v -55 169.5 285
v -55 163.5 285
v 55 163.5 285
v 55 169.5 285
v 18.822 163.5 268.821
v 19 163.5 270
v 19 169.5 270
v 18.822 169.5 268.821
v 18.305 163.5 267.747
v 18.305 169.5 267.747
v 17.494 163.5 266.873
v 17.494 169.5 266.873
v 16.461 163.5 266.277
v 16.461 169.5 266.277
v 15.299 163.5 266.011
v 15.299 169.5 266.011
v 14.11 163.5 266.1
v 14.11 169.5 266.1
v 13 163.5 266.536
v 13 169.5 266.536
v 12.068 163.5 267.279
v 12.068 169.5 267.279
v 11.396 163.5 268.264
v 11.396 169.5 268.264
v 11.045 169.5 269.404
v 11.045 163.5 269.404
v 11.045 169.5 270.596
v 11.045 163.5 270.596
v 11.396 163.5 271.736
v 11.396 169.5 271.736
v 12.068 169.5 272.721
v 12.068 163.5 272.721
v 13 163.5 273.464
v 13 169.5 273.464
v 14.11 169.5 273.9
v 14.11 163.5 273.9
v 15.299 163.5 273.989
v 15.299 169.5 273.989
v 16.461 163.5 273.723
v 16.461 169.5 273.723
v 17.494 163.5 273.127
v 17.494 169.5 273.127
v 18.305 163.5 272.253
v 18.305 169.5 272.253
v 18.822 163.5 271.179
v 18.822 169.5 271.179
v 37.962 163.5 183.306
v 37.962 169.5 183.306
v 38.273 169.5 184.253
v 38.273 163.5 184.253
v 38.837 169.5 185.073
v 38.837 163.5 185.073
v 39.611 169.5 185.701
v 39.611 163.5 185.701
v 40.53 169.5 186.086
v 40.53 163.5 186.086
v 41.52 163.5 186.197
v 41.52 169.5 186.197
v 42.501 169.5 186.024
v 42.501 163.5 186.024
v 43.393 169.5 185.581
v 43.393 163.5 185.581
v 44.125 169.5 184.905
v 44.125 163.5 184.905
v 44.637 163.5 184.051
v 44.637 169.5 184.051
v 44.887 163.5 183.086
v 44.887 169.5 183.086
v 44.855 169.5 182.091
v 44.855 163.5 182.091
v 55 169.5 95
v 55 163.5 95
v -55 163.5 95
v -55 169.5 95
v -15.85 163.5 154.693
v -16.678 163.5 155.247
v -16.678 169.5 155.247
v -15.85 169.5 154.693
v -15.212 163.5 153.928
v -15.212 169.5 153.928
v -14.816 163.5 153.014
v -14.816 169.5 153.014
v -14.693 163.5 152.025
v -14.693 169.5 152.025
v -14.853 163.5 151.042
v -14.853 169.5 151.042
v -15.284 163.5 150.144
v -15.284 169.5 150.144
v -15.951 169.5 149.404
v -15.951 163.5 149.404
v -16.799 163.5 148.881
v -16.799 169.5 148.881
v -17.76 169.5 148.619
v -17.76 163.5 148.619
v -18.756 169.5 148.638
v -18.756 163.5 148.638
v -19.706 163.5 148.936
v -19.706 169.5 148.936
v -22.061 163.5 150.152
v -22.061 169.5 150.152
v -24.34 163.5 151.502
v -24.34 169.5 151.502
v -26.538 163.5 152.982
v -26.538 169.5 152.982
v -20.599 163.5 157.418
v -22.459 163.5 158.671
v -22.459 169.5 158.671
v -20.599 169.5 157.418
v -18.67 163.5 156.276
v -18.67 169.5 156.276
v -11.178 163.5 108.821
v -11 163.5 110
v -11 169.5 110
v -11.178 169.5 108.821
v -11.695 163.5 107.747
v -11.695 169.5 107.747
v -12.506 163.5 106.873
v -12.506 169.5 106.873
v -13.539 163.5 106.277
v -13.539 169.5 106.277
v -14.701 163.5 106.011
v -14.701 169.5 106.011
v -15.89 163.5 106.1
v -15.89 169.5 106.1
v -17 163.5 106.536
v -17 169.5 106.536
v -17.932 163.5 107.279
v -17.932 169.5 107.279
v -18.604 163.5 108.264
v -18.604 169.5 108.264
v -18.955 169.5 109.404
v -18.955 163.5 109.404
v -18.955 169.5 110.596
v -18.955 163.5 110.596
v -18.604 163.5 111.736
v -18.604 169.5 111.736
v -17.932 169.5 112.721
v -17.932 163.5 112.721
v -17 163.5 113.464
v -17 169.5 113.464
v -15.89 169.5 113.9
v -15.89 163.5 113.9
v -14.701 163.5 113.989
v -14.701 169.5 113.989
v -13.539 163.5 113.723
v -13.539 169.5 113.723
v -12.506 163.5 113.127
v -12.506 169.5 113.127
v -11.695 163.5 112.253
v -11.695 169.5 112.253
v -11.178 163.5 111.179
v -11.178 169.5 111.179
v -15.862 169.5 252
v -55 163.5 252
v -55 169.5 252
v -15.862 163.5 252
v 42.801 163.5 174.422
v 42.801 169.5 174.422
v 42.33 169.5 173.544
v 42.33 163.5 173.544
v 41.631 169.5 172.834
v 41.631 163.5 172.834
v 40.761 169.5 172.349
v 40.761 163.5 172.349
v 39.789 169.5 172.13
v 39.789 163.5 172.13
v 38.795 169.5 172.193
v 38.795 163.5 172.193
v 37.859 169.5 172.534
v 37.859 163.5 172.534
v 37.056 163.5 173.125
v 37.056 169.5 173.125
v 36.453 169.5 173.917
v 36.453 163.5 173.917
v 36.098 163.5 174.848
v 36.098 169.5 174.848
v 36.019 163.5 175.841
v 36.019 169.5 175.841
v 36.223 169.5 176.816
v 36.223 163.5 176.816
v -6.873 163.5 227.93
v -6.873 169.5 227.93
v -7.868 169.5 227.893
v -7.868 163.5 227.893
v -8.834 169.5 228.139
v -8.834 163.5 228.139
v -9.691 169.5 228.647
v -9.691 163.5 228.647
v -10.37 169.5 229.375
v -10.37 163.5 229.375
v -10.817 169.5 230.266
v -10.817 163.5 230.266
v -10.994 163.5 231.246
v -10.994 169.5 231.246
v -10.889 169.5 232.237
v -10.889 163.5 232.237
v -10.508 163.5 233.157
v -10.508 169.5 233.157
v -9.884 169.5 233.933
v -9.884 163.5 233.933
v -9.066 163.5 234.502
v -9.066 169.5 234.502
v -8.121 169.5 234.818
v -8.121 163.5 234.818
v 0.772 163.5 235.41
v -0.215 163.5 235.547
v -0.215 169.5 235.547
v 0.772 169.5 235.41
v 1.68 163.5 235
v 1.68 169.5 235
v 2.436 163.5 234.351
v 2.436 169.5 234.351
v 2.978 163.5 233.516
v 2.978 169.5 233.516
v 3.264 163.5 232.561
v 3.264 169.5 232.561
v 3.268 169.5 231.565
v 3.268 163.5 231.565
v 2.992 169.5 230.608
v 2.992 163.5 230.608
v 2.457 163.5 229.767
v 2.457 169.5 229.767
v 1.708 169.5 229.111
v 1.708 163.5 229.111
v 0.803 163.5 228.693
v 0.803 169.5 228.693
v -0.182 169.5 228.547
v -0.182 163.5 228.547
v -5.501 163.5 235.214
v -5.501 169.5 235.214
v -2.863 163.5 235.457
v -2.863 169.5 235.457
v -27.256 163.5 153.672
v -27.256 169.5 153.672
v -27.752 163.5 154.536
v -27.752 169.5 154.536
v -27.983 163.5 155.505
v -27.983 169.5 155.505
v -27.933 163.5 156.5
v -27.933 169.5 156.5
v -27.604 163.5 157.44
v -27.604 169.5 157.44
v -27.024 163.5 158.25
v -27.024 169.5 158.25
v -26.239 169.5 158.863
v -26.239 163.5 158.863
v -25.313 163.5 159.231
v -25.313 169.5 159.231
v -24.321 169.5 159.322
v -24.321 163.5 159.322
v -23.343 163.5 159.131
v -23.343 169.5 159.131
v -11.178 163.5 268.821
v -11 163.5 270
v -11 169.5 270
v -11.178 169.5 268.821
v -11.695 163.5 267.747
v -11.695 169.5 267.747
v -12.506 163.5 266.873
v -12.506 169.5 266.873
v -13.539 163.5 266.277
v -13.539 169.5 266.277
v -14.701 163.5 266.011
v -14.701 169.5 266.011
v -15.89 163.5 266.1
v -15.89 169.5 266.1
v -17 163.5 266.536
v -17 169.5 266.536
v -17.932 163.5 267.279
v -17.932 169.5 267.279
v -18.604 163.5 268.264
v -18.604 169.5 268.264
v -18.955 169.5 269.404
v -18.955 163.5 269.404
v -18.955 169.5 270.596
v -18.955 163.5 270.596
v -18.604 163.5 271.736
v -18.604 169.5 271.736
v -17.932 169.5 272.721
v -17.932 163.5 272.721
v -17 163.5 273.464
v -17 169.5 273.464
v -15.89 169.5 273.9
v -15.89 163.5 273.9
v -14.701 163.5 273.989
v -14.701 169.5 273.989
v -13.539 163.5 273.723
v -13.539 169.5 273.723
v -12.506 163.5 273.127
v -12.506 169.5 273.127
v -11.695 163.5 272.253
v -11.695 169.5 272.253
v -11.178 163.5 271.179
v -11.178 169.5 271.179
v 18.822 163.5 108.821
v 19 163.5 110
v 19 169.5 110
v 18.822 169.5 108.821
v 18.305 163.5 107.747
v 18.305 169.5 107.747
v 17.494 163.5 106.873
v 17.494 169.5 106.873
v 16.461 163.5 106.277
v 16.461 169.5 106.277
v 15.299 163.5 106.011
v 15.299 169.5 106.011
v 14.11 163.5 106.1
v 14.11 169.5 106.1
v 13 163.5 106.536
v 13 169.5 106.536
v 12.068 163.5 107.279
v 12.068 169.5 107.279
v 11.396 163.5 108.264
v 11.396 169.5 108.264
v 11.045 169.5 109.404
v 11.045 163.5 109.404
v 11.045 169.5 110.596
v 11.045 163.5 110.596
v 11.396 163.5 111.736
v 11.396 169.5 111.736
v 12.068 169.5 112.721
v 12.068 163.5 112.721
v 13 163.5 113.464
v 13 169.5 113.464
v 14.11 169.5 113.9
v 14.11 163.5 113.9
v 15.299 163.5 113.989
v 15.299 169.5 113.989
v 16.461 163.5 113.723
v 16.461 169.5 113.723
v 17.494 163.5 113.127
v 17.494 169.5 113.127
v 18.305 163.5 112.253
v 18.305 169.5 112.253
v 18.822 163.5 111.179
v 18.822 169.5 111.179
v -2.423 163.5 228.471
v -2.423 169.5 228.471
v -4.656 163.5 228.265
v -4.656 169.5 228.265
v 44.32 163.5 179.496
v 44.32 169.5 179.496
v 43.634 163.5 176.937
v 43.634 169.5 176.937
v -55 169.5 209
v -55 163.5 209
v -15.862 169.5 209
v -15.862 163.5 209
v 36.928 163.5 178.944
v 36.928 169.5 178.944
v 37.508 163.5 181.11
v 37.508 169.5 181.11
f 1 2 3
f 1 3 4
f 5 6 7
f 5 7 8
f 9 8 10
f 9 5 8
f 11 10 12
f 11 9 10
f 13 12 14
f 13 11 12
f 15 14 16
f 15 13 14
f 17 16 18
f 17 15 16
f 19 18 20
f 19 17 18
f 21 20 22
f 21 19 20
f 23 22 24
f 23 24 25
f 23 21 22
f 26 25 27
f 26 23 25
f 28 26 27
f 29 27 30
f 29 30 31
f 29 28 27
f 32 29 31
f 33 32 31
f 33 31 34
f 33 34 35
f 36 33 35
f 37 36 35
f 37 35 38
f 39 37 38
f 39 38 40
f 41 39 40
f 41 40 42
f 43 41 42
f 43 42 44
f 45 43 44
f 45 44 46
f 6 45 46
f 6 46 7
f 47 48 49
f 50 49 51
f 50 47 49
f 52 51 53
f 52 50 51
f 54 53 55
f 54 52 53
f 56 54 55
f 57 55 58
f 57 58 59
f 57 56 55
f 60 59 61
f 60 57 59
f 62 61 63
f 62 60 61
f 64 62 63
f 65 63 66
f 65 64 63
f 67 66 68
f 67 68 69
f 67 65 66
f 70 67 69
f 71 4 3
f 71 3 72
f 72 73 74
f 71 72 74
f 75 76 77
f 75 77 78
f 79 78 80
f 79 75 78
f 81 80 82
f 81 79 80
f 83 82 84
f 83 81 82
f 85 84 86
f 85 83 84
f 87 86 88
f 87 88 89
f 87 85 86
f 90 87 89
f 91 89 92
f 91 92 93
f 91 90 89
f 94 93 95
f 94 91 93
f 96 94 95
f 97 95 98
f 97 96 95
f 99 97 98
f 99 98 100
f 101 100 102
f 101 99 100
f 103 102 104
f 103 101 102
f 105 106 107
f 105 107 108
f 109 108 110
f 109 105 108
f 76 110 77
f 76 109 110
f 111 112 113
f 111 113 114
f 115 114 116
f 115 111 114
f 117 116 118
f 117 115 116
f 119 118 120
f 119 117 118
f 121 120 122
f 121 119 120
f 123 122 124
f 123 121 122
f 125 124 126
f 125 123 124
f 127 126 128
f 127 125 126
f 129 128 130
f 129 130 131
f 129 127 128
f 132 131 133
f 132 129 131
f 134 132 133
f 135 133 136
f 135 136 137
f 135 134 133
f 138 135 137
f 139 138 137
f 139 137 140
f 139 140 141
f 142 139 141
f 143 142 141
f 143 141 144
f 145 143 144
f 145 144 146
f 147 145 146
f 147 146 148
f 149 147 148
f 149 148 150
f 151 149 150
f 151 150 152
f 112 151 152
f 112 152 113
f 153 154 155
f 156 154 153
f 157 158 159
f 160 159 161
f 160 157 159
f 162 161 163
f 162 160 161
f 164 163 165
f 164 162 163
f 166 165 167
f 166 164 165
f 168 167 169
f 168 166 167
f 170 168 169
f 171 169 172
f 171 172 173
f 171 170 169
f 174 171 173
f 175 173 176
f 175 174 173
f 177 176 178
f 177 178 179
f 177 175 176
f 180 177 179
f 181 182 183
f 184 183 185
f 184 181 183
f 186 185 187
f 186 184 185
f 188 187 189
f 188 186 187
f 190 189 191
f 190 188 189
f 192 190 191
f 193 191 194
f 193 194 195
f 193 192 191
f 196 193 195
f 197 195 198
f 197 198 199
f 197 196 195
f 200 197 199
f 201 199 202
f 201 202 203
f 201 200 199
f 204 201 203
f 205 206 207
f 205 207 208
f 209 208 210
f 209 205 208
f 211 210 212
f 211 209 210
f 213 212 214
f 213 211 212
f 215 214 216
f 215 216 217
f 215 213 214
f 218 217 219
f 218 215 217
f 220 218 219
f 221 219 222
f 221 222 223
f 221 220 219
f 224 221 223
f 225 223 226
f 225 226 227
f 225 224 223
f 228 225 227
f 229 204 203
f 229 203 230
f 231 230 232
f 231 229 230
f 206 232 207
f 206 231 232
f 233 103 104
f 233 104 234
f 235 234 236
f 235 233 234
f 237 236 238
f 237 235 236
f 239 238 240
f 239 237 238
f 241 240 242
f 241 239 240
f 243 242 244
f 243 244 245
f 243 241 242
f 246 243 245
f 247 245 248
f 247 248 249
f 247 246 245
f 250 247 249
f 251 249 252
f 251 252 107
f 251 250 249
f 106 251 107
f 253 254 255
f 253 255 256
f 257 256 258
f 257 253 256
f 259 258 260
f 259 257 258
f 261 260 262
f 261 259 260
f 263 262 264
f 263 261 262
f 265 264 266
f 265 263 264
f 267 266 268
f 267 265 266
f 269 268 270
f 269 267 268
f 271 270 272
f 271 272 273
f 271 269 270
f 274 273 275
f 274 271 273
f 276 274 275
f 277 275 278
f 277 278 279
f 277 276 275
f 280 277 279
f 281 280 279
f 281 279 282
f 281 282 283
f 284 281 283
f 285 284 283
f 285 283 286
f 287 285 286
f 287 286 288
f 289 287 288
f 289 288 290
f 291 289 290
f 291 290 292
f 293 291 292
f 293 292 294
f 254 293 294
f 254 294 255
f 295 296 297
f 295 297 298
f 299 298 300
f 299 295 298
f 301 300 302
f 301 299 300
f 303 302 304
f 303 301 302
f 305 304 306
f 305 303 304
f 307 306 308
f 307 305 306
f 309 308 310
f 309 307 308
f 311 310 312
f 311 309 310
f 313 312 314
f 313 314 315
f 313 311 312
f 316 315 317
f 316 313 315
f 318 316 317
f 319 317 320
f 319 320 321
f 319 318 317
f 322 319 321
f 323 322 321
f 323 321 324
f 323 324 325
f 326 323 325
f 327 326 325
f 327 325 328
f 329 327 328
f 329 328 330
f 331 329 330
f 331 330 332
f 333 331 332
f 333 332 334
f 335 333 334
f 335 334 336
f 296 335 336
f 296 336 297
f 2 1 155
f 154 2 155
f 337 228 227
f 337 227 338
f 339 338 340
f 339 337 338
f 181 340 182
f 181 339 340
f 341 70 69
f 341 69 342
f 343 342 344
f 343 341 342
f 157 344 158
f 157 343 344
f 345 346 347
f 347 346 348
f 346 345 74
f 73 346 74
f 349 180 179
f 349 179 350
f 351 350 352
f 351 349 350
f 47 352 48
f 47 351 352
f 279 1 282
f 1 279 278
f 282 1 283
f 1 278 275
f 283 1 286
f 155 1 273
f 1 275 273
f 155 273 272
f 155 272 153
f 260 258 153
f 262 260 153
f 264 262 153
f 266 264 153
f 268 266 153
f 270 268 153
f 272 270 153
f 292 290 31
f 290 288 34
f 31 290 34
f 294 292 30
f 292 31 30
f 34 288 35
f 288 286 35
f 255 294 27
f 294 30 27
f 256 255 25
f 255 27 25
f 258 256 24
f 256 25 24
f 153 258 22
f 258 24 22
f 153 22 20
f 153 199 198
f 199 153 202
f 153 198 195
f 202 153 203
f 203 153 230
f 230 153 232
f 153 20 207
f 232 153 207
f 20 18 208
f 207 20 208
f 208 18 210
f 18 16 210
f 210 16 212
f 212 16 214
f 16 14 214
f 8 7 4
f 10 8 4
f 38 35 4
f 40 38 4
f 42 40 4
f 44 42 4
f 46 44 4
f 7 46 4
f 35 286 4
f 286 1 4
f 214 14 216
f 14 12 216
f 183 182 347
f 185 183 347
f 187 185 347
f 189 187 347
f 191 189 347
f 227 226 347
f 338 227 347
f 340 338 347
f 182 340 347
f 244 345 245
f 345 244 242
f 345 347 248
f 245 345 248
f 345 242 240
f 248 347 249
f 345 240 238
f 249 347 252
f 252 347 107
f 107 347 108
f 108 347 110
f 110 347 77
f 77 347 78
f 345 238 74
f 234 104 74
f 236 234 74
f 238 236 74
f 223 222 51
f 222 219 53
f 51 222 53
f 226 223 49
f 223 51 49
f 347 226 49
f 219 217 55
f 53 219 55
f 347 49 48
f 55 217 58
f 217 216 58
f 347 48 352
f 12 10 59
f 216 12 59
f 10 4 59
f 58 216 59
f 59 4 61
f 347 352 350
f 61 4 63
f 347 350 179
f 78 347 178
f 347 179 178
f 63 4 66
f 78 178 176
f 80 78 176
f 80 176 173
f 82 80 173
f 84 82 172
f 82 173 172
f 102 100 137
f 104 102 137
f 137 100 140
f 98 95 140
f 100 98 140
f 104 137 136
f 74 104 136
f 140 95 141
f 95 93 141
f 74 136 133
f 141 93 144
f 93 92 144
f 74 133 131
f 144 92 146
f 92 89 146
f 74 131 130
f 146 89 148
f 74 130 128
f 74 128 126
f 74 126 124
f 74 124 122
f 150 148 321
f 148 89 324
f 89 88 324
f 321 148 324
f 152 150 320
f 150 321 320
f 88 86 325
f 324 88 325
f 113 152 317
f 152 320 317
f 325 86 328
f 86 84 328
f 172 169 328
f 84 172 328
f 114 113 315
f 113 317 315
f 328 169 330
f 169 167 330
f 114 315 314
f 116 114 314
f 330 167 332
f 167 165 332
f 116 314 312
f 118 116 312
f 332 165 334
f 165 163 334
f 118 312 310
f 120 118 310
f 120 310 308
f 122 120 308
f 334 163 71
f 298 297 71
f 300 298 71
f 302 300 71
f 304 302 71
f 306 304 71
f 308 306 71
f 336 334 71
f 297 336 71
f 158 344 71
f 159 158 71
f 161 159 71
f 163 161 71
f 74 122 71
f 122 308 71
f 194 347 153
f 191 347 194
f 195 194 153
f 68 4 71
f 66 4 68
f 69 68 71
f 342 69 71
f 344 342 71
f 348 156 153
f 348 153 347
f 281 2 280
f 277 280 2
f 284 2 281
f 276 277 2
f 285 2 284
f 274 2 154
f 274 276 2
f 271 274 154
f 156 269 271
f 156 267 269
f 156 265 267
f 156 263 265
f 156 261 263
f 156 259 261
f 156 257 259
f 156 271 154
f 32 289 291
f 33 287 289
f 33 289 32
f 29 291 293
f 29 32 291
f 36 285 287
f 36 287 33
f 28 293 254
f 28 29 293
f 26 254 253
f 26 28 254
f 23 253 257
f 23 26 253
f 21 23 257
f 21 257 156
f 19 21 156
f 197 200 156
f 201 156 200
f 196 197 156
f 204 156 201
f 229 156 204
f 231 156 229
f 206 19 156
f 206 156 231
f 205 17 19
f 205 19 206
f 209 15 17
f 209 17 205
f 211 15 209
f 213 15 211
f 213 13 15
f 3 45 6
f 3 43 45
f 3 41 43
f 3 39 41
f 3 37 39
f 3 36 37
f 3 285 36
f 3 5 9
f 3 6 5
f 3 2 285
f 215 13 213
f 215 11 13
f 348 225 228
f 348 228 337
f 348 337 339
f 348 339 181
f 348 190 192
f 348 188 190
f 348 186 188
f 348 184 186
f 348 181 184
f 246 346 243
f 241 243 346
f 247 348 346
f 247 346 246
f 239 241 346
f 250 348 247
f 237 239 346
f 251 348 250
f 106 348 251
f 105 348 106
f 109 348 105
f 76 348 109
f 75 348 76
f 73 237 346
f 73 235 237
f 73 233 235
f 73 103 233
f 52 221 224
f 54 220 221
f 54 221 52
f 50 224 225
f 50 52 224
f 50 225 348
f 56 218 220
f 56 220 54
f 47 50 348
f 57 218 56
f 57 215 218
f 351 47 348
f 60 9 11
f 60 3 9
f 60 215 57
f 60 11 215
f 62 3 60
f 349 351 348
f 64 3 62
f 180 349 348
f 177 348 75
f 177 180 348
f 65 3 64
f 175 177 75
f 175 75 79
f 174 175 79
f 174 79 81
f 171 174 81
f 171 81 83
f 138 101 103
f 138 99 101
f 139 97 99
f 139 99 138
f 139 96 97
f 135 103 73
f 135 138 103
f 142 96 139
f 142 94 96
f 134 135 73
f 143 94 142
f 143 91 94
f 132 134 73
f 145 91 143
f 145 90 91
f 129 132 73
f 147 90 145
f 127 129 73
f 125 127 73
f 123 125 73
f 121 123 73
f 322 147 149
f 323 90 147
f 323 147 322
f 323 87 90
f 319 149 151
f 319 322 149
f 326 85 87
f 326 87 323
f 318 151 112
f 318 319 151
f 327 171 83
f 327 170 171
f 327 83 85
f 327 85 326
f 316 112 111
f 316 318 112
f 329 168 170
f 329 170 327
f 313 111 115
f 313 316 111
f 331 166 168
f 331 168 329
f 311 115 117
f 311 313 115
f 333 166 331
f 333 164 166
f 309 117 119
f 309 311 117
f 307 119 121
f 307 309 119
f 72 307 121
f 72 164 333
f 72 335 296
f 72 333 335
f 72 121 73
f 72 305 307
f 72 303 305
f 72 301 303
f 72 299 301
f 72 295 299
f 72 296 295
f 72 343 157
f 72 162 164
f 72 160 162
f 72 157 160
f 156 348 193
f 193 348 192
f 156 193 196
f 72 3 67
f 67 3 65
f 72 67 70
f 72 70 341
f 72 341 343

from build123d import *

# Parameters (mm, degrees)
SKIZZE3_W                            = 190
SKIZZE3_H                            = 6
AUFSATZ_LINEAR_AUSTRAGEN2_DEPTH      = 55
AUFSATZ_LINEAR_AUSTRAGEN2_DEPTH_BACK = 55
SCHNITT_LINEAR_AUSTRAGEN5_DEPTH      = 169.5
OUTLINETOP_R                         = 3
SCHNITT_LINEAR_AUSTRAGEN6_DEPTH      = 169.5
SKIZZE8_W                            = 39.137679275
SKIZZE8_H                            = 43
SCHNITT_LINEAR_AUSTRAGEN7_DEPTH      = 169.5
SKIZZE9_R                            = 4
SCHNITT_LINEAR_AUSTRAGEN8_DEPTH      = 169.5


with BuildPart() as part:
    # Skizze3 → Aufsatz-Linear austragen2 (new body, two sides)
    with BuildSketch(Plane(origin=(0, 0, 0), x_dir=(0, 0, -1), z_dir=(1, 0, 0))) as aufsatz_linear_austragen2_sk:
        with Locations((-190, 166.5)):
            Rectangle(SKIZZE3_W, SKIZZE3_H)
    extrude(amount=AUFSATZ_LINEAR_AUSTRAGEN2_DEPTH)
    extrude(aufsatz_linear_austragen2_sk.sketch, amount=-AUFSATZ_LINEAR_AUSTRAGEN2_DEPTH_BACK)

    # Holes → Schnitt-Linear austragen5 (cut)
    with BuildSketch(Plane(origin=(0, 0, 0), x_dir=(1, 0, 0), z_dir=(0, 1, 0))):
        with BuildLine():
            ThreePointArc((-19.706276733, -148.936330777), (-23.210222992, -150.810105621), (-26.537525439, -152.982139225))
            ThreePointArc((-26.537525439, -152.982139225), (-27.342866764, -157.865931333), (-22.459074657, -158.671272659))
            ThreePointArc((-22.459074657, -158.671272659), (-19.643132597, -156.833050591), (-16.677694436, -155.247249036))
            ThreePointArc((-16.677694436, -155.247249036), (-15.036526455, -150.577498758), (-19.706276733, -148.936330777))
        make_face()
        with BuildLine():
            ThreePointArc((44.855396174, -182.090783424), (43.995374204, -178.211475011), (42.800520871, -174.421884392))
            ThreePointArc((42.800520871, -174.421884392), (38.314526197, -172.330030721), (36.222672526, -176.816025395))
            ThreePointArc((36.222672526, -176.816025395), (37.23389342, -180.023208327), (37.961741903, -183.306320668))
            ThreePointArc((37.961741903, -183.306320668), (42.01633766, -186.145379182), (44.855396174, -182.090783424))
        make_face()
        with BuildLine():
            ThreePointArc((-8.120828878, -234.817568107), (-4.183818236, -235.354800603), (-0.214966211, -235.546855679))
            ThreePointArc((-0.214966211, -235.546855679), (3.301513476, -232.063413328), (-0.181928876, -228.546933641))
            ThreePointArc((-0.181928876, -228.546933641), (-3.540823214, -228.384394775), (-6.872769749, -227.929727487))
            ThreePointArc((-6.872769749, -227.929727487), (-10.940719624, -230.749618233), (-8.120828878, -234.817568107))
        make_face()
    extrude(amount=SCHNITT_LINEAR_AUSTRAGEN5_DEPTH, mode=Mode.SUBTRACT)

    # OutlineTop → Schnitt-Linear austragen6 (cut)
    with BuildSketch(Plane(origin=(0, 0, 0), x_dir=(1, 0, 0), z_dir=(0, 1, 0))):
        with Locations((-15, -270)):
            Circle(OUTLINETOP_R)
        with Locations((15, -270)):
            Circle(OUTLINETOP_R)
        with Locations((-15, -110)):
            Circle(OUTLINETOP_R)
        with Locations((15, -110)):
            Circle(OUTLINETOP_R)
    extrude(amount=SCHNITT_LINEAR_AUSTRAGEN6_DEPTH, mode=Mode.SUBTRACT)

    # Skizze8 → Schnitt-Linear austragen7 (cut)
    with BuildSketch(Plane(origin=(0, 0, 0), x_dir=(1, 0, 0), z_dir=(0, 1, 0))):
        with Locations((-35.431160363, -230.5)):
            Rectangle(SKIZZE8_W, SKIZZE8_H)
    extrude(amount=SCHNITT_LINEAR_AUSTRAGEN7_DEPTH, mode=Mode.SUBTRACT)

    # Skizze9 → Schnitt-Linear austragen8 (cut)
    with BuildSketch(Plane(origin=(0, 0, 0), x_dir=(1, 0, 0), z_dir=(0, 1, 0))):
        with Locations((-15, -110)):
            Circle(SKIZZE9_R)
        with Locations((15, -110)):
            Circle(SKIZZE9_R)
        with Locations((15, -270)):
            Circle(SKIZZE9_R)
        with Locations((-15, -270)):
            Circle(SKIZZE9_R)
    extrude(amount=SCHNITT_LINEAR_AUSTRAGEN8_DEPTH, mode=Mode.SUBTRACT)


solid = part.part
